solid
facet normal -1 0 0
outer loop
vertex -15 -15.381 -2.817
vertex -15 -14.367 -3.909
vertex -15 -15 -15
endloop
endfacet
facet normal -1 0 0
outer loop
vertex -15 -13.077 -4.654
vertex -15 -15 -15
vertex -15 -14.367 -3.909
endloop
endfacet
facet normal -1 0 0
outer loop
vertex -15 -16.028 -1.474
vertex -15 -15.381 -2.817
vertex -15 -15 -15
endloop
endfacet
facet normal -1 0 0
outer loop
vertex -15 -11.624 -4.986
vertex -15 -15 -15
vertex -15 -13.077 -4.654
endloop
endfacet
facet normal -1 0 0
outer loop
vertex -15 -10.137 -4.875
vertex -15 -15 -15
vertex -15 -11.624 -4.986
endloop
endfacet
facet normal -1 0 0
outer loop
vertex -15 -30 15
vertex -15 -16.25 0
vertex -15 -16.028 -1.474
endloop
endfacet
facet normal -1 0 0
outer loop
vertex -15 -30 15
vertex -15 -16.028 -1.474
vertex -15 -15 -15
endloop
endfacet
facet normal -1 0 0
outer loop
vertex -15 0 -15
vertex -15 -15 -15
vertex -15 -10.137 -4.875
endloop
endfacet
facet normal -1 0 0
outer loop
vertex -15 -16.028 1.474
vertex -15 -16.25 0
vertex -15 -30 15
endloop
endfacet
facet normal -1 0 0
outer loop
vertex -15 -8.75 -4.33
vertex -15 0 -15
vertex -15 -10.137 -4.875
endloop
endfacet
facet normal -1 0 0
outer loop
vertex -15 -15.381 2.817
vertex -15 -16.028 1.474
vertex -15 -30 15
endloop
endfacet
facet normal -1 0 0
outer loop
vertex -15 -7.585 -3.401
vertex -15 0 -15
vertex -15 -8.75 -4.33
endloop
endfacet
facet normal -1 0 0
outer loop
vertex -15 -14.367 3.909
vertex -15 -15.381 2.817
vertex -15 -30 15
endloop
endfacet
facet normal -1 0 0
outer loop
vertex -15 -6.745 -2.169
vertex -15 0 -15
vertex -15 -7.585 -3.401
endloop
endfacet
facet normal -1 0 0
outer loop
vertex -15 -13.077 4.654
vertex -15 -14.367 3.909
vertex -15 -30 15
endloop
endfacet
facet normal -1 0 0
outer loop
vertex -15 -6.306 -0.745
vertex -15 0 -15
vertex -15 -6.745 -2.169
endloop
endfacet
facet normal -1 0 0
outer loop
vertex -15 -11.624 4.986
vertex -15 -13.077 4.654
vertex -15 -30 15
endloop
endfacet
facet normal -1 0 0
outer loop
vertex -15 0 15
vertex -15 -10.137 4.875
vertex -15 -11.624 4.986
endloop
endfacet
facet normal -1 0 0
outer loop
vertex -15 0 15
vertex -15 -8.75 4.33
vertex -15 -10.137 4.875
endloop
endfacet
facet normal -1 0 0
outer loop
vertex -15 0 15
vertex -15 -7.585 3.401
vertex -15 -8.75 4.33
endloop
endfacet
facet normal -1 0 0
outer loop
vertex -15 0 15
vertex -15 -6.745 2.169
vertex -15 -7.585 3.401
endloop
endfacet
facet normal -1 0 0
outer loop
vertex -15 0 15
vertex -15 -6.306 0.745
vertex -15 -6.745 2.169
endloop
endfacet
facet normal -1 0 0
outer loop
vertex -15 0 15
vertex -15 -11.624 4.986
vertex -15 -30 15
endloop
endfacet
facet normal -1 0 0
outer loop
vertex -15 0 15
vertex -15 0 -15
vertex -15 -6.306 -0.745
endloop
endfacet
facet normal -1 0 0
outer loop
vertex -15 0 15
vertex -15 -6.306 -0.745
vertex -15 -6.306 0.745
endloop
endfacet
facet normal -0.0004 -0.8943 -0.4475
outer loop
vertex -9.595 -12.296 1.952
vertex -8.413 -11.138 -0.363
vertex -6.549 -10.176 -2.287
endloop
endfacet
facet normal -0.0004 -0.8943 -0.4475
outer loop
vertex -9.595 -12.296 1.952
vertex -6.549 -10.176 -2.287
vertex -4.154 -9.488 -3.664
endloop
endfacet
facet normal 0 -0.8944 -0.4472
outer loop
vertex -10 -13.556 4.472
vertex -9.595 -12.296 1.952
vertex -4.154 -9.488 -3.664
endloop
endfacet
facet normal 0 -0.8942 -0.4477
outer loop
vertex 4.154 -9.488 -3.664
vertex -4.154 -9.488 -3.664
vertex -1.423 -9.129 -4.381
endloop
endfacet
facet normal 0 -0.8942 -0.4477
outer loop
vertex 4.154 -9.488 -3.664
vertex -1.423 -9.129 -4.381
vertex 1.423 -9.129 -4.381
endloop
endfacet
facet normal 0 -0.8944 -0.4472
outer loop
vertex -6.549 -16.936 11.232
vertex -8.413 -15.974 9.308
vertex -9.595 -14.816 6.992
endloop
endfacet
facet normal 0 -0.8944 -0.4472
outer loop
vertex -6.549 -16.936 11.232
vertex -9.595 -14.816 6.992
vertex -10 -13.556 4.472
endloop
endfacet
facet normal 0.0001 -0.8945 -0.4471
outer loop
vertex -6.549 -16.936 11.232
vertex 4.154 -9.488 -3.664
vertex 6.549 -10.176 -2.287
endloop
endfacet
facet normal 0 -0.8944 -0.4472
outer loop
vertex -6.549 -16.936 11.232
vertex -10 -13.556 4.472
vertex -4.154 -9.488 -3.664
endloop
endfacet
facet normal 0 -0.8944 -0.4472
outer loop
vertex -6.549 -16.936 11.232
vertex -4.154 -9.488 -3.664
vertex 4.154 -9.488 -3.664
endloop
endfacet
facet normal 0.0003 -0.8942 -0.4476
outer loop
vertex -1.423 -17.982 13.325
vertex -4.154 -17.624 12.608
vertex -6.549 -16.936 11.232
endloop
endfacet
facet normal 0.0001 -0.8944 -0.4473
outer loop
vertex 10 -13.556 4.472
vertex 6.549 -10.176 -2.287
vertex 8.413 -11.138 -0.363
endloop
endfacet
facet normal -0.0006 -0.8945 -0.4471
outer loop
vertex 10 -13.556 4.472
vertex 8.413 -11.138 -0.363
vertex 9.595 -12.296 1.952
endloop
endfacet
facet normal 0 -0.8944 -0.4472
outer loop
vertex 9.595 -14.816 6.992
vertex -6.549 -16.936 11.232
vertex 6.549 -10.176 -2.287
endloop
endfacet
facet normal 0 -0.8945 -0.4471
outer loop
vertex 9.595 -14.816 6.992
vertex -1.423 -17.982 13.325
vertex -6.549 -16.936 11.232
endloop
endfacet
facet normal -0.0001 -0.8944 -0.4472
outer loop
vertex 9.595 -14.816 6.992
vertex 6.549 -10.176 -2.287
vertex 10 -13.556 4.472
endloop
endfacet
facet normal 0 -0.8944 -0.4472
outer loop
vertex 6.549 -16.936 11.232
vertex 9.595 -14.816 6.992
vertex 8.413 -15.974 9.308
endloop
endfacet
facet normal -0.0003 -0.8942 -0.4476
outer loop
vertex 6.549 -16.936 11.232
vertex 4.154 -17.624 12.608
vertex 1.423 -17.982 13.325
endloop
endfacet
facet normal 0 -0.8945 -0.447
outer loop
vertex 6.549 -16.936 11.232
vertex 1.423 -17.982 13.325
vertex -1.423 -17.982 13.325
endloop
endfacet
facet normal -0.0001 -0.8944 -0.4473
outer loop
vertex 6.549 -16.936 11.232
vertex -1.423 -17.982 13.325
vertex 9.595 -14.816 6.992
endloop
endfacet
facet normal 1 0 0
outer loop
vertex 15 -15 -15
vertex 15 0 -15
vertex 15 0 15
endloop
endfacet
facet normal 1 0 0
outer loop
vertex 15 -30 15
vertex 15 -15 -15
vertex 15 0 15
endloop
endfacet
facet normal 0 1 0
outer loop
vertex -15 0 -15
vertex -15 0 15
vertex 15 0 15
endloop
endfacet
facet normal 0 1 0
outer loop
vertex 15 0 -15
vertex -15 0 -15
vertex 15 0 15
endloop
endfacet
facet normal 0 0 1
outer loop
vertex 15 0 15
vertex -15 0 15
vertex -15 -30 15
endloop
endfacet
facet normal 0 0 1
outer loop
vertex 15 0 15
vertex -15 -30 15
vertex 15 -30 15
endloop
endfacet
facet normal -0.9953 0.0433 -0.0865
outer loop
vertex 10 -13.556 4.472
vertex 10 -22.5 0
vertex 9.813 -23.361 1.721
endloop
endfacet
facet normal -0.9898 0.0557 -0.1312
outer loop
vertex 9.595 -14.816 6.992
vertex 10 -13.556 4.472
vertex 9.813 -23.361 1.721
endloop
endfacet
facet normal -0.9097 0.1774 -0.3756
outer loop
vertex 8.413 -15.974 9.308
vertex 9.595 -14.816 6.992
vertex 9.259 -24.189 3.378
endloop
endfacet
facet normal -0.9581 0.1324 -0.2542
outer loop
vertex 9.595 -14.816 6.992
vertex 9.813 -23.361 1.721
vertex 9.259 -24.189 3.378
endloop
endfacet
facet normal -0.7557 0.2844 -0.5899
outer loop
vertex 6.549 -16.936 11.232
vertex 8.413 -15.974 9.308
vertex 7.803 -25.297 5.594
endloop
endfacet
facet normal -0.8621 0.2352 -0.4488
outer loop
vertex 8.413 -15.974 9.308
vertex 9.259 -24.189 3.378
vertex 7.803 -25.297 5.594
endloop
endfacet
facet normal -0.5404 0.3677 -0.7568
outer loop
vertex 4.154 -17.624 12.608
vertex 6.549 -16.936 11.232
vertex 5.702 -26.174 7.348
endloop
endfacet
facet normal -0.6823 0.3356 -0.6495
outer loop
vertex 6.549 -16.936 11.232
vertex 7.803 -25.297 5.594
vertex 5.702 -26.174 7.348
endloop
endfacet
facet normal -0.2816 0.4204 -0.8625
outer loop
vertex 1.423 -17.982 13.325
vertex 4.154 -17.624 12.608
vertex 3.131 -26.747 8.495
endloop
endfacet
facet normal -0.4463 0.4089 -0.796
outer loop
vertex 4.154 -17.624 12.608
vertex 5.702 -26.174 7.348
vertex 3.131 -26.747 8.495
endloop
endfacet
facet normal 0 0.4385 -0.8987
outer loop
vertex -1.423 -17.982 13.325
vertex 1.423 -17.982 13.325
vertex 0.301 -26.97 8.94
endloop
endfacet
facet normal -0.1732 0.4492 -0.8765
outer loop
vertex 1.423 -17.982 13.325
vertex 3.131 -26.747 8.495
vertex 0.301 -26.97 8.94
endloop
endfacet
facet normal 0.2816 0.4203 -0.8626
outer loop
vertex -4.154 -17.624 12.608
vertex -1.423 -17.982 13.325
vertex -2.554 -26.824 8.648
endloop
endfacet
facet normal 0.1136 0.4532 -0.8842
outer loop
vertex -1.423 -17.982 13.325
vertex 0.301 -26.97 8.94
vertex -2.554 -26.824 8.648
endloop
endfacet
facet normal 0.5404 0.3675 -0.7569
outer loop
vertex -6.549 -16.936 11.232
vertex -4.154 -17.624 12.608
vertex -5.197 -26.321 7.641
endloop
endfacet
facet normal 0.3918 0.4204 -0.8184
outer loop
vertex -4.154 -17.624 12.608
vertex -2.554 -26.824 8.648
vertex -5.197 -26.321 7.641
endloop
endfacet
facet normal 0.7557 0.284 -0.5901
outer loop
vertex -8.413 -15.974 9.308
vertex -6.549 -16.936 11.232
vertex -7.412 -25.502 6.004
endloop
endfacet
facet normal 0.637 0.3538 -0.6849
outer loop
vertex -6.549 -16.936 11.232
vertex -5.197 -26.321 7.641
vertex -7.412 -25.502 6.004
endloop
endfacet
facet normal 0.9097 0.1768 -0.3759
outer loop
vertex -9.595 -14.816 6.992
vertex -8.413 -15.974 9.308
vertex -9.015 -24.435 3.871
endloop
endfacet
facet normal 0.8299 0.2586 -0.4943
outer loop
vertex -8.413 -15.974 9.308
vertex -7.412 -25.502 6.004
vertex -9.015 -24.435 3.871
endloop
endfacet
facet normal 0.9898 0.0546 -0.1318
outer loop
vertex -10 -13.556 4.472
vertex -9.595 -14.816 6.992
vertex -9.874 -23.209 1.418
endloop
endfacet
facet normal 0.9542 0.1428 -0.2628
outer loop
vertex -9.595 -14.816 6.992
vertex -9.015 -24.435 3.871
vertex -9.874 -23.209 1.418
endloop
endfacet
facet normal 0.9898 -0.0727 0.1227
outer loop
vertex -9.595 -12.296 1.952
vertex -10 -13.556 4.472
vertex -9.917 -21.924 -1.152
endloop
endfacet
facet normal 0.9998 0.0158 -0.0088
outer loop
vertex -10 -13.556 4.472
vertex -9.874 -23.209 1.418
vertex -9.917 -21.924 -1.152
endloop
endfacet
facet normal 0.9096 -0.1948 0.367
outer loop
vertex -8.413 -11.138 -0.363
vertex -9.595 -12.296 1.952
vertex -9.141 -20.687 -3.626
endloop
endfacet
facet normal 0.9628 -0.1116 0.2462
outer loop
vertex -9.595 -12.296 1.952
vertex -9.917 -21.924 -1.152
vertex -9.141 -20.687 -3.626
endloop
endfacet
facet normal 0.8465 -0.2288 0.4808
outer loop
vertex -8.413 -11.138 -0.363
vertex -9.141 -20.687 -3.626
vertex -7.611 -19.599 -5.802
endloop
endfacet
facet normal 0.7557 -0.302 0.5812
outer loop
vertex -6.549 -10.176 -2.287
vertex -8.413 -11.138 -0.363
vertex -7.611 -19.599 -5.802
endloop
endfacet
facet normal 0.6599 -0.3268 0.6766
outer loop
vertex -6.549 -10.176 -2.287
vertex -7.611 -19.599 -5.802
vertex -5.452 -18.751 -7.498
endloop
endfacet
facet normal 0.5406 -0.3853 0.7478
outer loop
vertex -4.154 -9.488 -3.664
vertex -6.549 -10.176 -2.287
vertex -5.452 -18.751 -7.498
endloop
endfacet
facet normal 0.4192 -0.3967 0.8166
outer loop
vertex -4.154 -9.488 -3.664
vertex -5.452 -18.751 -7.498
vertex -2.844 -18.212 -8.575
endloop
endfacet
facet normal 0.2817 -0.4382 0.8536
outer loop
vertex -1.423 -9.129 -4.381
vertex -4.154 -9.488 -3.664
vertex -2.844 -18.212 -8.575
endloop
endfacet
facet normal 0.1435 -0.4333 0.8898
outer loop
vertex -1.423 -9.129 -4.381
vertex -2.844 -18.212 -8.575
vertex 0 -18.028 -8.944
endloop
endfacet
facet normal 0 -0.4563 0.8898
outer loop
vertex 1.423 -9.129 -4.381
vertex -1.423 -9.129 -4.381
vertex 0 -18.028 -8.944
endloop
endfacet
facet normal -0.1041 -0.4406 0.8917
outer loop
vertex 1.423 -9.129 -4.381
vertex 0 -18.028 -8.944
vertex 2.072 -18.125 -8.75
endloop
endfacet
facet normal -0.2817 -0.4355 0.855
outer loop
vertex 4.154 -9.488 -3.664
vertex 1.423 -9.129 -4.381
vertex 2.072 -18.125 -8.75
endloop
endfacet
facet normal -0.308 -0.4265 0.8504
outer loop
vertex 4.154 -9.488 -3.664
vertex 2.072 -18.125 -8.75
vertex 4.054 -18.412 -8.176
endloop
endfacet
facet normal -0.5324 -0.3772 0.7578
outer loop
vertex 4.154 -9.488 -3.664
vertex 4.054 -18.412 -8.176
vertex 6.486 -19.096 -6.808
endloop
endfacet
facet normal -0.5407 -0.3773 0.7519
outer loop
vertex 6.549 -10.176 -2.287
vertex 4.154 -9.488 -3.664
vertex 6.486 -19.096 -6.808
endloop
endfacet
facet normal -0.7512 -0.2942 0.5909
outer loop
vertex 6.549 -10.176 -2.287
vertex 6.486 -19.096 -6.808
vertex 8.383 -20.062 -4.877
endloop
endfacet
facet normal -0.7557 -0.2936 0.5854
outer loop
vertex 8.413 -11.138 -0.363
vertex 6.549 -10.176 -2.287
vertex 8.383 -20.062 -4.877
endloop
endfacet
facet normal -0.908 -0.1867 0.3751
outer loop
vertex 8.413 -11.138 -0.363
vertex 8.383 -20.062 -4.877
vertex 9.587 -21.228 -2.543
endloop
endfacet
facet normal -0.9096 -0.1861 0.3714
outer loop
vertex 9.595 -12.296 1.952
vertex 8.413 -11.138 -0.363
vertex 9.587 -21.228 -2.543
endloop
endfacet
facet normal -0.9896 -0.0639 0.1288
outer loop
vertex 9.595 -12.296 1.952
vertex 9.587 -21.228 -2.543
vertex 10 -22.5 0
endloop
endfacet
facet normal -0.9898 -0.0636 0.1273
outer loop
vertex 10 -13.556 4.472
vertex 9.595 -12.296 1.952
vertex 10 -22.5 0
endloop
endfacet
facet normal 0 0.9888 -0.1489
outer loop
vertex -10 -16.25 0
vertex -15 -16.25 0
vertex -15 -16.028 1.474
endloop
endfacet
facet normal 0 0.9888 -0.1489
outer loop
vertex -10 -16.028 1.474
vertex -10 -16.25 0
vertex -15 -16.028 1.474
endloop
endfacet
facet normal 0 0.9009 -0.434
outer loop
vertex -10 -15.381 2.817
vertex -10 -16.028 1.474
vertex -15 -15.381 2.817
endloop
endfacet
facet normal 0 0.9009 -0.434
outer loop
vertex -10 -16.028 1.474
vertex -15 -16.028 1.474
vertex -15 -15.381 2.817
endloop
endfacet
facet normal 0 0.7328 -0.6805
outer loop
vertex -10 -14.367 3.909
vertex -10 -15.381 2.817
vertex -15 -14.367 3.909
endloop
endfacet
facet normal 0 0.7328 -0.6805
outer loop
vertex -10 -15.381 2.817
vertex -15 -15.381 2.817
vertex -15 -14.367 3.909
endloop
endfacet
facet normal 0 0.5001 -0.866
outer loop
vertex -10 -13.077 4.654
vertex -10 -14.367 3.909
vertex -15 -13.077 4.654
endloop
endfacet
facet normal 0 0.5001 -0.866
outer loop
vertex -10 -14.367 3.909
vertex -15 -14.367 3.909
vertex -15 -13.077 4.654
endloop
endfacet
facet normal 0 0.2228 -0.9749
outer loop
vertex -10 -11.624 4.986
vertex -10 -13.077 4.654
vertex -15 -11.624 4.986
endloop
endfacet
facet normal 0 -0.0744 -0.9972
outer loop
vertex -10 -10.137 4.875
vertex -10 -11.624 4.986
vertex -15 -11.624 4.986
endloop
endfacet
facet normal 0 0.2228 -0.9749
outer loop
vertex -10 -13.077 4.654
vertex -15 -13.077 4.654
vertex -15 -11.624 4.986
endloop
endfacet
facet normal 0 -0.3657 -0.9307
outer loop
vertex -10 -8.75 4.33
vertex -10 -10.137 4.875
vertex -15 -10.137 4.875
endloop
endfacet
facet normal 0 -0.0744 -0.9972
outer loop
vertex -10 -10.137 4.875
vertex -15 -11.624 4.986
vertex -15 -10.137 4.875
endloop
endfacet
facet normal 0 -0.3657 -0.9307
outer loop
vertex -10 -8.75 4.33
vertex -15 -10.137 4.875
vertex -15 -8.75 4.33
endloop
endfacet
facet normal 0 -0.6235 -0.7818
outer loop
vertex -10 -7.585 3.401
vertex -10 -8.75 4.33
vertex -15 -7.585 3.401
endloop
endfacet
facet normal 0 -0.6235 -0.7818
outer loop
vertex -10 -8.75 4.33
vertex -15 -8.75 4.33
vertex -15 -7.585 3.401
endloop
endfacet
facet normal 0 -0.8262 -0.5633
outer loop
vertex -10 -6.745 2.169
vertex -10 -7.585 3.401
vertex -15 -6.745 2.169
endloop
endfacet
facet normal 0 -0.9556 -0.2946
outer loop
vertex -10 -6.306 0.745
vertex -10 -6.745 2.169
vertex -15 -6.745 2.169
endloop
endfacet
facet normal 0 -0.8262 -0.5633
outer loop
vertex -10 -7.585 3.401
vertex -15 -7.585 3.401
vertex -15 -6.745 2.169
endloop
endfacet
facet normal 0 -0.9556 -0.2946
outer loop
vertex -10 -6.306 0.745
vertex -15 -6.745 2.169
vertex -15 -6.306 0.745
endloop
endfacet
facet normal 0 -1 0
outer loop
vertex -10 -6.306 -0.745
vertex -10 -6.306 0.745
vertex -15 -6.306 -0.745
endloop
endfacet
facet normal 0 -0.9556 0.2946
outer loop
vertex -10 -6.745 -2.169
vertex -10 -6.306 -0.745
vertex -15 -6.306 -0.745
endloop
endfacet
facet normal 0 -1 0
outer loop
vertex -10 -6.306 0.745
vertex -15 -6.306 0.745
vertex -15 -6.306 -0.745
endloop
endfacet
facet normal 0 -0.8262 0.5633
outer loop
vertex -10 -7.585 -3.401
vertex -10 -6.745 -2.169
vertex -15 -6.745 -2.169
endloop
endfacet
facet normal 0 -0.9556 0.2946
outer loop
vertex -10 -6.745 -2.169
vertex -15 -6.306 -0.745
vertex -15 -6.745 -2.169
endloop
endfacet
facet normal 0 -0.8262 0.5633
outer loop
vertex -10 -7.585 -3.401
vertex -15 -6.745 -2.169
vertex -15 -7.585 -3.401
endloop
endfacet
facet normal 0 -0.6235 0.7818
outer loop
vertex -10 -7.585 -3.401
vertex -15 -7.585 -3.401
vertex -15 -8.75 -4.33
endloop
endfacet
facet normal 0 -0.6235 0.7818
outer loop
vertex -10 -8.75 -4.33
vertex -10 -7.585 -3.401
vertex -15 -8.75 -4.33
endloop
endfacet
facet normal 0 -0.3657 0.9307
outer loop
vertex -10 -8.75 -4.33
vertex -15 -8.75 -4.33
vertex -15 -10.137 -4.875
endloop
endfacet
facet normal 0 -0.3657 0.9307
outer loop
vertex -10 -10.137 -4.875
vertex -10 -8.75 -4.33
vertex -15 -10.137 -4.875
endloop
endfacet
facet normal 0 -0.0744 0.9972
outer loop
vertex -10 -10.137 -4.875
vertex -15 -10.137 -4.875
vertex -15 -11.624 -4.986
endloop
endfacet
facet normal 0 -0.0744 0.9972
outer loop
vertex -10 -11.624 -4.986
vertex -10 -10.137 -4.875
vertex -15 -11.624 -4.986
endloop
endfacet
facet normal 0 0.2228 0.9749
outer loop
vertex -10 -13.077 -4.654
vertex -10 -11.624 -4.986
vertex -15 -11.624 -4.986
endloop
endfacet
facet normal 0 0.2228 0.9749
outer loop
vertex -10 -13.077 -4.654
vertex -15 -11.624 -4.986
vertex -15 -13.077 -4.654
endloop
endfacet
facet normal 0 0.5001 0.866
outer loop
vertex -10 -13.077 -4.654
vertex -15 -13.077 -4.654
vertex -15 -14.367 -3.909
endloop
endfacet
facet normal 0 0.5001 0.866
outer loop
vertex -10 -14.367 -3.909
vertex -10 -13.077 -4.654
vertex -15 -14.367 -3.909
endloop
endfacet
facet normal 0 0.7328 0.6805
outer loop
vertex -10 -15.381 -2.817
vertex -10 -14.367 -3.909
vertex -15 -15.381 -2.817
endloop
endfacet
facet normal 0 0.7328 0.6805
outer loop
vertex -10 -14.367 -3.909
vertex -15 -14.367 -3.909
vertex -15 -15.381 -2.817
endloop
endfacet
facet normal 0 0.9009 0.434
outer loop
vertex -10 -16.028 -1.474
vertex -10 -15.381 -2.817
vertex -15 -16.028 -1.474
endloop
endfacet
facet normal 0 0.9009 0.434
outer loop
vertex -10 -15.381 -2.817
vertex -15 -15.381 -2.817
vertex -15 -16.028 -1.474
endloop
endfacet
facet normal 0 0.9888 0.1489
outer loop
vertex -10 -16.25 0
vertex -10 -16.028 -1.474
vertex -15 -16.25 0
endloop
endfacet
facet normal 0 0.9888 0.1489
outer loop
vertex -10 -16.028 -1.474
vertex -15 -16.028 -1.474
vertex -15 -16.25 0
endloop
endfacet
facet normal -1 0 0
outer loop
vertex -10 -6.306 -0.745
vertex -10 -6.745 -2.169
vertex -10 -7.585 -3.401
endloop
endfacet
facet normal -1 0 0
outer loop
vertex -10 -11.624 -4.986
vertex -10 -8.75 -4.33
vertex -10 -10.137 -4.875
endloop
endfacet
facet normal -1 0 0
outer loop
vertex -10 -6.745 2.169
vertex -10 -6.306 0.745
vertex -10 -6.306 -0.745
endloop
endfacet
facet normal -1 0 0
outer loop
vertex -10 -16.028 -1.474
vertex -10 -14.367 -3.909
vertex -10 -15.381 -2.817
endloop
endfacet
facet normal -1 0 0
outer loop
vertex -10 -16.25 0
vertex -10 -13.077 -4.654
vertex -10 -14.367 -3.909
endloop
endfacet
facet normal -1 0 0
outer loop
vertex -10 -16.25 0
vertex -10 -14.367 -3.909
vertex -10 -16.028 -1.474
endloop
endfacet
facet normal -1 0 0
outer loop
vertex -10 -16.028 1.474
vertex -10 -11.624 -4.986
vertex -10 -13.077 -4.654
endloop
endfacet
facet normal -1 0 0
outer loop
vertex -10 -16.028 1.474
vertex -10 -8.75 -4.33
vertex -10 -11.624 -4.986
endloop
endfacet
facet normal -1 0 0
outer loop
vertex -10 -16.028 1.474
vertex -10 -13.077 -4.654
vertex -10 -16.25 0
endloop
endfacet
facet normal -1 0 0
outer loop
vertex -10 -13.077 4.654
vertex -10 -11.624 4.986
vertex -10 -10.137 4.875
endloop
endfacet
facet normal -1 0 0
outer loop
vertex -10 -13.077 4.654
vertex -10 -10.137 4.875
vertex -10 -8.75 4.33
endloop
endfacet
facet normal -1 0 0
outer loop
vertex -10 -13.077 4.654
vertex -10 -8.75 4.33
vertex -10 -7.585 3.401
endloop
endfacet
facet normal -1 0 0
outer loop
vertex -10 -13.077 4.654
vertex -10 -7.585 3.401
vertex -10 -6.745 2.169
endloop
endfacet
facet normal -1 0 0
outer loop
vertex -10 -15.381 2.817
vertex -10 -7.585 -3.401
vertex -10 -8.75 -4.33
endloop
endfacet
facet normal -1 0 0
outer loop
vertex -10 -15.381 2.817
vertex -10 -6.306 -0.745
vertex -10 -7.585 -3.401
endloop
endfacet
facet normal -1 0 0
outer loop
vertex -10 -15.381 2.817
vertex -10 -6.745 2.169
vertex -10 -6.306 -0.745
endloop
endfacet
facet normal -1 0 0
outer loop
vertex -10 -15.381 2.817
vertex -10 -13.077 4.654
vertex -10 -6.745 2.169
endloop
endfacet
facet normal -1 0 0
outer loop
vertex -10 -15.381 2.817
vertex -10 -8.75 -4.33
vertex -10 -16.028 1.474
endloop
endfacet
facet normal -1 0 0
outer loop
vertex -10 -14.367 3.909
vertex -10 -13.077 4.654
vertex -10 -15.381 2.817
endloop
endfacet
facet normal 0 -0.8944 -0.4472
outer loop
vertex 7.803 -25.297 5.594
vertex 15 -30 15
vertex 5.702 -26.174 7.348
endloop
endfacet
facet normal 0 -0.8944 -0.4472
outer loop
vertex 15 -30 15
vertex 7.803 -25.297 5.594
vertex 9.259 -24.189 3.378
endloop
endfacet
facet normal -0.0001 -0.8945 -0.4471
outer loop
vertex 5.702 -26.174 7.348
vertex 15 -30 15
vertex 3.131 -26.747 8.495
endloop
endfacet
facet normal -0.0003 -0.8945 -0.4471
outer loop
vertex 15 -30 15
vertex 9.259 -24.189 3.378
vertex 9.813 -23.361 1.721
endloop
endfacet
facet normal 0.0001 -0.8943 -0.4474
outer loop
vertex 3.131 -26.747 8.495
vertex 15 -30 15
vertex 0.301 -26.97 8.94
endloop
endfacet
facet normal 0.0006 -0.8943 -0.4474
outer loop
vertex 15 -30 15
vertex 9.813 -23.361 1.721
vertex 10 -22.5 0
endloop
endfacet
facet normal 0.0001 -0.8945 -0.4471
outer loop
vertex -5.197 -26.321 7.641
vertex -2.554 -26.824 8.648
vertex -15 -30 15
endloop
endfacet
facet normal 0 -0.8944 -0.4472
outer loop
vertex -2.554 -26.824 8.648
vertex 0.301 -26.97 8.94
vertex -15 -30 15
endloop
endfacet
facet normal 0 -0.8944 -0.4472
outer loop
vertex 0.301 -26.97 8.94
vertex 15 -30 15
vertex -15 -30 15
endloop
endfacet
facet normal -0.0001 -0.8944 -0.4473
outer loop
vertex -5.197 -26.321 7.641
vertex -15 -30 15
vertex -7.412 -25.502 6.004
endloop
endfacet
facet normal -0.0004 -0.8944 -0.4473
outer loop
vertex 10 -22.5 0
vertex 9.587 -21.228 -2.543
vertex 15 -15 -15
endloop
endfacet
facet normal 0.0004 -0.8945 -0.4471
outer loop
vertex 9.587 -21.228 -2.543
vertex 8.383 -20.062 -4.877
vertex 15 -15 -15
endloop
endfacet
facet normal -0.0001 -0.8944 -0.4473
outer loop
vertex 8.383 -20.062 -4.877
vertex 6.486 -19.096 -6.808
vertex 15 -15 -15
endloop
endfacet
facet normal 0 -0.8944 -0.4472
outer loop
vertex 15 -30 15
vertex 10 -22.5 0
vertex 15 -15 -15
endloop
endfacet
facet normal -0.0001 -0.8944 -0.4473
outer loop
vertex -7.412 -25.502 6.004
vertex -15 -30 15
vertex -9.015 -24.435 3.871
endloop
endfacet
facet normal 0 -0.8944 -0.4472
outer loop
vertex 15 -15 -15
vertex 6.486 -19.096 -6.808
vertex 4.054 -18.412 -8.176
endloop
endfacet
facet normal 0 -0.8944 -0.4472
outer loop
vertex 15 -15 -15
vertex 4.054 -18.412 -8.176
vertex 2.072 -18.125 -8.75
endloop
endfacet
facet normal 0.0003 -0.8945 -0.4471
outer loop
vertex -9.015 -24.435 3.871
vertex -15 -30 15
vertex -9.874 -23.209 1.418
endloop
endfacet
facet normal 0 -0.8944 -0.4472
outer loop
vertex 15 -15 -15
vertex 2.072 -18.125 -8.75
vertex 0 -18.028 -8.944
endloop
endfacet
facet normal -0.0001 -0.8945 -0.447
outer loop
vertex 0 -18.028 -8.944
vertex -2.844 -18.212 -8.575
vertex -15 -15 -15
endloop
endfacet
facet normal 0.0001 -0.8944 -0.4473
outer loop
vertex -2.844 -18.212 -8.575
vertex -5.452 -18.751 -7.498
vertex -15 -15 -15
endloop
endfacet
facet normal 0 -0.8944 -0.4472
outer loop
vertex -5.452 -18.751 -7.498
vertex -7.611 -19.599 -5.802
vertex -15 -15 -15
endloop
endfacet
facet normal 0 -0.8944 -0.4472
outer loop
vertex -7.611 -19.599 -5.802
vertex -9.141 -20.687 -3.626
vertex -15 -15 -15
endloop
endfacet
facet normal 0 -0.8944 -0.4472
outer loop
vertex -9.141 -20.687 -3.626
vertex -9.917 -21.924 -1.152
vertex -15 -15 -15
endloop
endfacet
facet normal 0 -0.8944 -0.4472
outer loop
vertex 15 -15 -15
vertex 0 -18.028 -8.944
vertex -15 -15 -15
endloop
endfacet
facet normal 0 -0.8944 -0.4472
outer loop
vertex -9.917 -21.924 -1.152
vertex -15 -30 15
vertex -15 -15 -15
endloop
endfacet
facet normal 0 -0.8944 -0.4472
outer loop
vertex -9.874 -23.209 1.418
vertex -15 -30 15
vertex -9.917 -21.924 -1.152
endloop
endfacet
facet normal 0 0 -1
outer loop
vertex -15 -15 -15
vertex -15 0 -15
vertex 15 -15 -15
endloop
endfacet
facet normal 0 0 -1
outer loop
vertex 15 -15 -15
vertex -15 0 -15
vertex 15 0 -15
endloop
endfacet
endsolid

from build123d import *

# Parameters (mm, degrees)
F0_W     = 30
F0_H     = 30
F1_DEPTH = 30
F3_DEPTH = 30
F4_R     = 10
F5_DEPTH = 10
F6_R     = 5
F7_DEPTH = 5


with BuildPart() as f1:
    # F0 (on Front) → F1 (new body)
    with BuildSketch(Plane.XZ):
        Rectangle(F0_W, F0_H)
    extrude(amount=F1_DEPTH)

    # F2 (on face) → F3 (cut)
    with BuildSketch(Plane(origin=(-15, 0, 0), x_dir=(0, -1, 0), z_dir=(-1, 0, 0))):
        Polygon((30, -15), (30, 15), (15, -15), align=None)
    extrude(amount=-F3_DEPTH, mode=Mode.SUBTRACT)

    # F4 (on face) → F5 (cut)
    with BuildSketch(Plane(origin=(0, -18, -9), x_dir=(1, 0, 0), z_dir=(0, -0.894427, -0.447214))):
        with Locations((0, 10.062306)):
            Circle(F4_R)
    extrude(amount=-F5_DEPTH, mode=Mode.SUBTRACT)

    # F6 (on face) → F7 (cut)
    with BuildSketch(Plane(origin=(-15, 0, 0), x_dir=(0, -1, 0), z_dir=(-1, 0, 0))):
        with Locations((11.25, 0)):
            Circle(F6_R)
    extrude(amount=-F7_DEPTH, mode=Mode.SUBTRACT)


solid = f1.part
